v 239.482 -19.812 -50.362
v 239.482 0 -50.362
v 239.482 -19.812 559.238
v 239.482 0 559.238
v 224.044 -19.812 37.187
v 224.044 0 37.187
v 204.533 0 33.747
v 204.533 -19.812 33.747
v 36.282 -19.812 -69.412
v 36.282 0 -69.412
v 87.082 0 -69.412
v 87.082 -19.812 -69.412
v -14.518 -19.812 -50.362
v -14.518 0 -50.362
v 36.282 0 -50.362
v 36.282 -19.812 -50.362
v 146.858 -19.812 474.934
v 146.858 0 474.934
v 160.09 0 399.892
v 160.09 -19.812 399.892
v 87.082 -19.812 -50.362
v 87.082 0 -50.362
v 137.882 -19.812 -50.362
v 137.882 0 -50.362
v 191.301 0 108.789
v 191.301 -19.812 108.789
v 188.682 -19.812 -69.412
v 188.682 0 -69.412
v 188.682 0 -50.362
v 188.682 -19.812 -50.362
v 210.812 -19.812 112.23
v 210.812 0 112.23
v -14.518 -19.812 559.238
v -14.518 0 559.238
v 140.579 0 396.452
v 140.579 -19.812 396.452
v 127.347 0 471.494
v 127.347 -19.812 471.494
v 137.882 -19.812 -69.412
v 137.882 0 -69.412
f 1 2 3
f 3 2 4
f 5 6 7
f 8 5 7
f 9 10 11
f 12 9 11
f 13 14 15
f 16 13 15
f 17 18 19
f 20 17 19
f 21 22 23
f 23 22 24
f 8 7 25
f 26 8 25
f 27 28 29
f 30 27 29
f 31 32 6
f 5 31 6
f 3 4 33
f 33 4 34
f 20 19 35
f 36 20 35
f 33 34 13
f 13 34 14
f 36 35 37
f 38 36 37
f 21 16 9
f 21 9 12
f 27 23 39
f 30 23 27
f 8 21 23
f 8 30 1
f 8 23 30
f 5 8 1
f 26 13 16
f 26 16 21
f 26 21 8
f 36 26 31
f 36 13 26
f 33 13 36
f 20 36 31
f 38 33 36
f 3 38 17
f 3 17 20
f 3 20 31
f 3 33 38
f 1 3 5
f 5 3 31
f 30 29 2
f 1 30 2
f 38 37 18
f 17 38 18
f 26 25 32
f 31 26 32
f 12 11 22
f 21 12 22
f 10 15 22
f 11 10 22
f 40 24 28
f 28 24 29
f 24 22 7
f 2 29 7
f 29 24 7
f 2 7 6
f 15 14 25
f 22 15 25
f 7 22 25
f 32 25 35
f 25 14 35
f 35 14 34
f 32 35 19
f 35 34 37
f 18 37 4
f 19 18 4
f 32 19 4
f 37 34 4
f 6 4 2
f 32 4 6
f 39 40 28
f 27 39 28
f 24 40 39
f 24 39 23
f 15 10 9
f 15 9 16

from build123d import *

# Parameters (mm, degrees)
F0_W     = 50.8
F0_H     = 19.05
F1_DEPTH = 19.812


# Not quite as in the source:
# - a feature names something its author has since deleted; it is built from what else it names


with BuildPart() as f1:
    # F0 (on Front) → F1 (new body)
    with BuildSketch(Plane.XZ):
        Polygon((239.4815002712, 559.237990855), (-14.5184997288, 559.237990855), (-14.5184997288, -50.362009145), (36.2815002712, -50.362009145), (87.0815002712, -50.362009145), (137.8815002712, -50.362009145), (188.6815002712, -50.362009145), (219.3638682365, -50.362009145), (204.533166074, 33.7470824019), (191.3011749357, 108.7894331814), (140.5785422392, 396.4517778362), (127.346551101, 471.4941286158), (113.5079391308, 549.9767970912), (133.6255711655, 549.9767970912), (146.8575623037, 474.9344463117), (160.0895534419, 399.8920955322), (210.8121861384, 112.2297508773), (224.0441772766, 37.1874000978), (239.4815002712, -50.362009145), align=None)
        with Locations((61.6815002712, -59.887009145)):
            Rectangle(F0_W, F0_H)
        with Locations((163.2815002712, -59.887009145)):
            Rectangle(F0_W, F0_H)
        Polygon((127.346551101, 471.4941286158), (146.8575623037, 474.9344463117), (133.6255711655, 549.9767970912), (113.5079391308, 549.9767970912), align=None)
        Polygon((219.3638682365, -50.362009145), (239.4815002712, -50.362009145), (224.0441772766, 37.1874000978), (204.533166074, 33.7470824019), align=None)
        Polygon((191.3011749357, 108.7894331814), (210.8121861384, 112.2297508773), (160.0895534419, 399.8920955322), (140.5785422392, 396.4517778362), align=None)
    extrude(amount=F1_DEPTH)


solid = f1.part
